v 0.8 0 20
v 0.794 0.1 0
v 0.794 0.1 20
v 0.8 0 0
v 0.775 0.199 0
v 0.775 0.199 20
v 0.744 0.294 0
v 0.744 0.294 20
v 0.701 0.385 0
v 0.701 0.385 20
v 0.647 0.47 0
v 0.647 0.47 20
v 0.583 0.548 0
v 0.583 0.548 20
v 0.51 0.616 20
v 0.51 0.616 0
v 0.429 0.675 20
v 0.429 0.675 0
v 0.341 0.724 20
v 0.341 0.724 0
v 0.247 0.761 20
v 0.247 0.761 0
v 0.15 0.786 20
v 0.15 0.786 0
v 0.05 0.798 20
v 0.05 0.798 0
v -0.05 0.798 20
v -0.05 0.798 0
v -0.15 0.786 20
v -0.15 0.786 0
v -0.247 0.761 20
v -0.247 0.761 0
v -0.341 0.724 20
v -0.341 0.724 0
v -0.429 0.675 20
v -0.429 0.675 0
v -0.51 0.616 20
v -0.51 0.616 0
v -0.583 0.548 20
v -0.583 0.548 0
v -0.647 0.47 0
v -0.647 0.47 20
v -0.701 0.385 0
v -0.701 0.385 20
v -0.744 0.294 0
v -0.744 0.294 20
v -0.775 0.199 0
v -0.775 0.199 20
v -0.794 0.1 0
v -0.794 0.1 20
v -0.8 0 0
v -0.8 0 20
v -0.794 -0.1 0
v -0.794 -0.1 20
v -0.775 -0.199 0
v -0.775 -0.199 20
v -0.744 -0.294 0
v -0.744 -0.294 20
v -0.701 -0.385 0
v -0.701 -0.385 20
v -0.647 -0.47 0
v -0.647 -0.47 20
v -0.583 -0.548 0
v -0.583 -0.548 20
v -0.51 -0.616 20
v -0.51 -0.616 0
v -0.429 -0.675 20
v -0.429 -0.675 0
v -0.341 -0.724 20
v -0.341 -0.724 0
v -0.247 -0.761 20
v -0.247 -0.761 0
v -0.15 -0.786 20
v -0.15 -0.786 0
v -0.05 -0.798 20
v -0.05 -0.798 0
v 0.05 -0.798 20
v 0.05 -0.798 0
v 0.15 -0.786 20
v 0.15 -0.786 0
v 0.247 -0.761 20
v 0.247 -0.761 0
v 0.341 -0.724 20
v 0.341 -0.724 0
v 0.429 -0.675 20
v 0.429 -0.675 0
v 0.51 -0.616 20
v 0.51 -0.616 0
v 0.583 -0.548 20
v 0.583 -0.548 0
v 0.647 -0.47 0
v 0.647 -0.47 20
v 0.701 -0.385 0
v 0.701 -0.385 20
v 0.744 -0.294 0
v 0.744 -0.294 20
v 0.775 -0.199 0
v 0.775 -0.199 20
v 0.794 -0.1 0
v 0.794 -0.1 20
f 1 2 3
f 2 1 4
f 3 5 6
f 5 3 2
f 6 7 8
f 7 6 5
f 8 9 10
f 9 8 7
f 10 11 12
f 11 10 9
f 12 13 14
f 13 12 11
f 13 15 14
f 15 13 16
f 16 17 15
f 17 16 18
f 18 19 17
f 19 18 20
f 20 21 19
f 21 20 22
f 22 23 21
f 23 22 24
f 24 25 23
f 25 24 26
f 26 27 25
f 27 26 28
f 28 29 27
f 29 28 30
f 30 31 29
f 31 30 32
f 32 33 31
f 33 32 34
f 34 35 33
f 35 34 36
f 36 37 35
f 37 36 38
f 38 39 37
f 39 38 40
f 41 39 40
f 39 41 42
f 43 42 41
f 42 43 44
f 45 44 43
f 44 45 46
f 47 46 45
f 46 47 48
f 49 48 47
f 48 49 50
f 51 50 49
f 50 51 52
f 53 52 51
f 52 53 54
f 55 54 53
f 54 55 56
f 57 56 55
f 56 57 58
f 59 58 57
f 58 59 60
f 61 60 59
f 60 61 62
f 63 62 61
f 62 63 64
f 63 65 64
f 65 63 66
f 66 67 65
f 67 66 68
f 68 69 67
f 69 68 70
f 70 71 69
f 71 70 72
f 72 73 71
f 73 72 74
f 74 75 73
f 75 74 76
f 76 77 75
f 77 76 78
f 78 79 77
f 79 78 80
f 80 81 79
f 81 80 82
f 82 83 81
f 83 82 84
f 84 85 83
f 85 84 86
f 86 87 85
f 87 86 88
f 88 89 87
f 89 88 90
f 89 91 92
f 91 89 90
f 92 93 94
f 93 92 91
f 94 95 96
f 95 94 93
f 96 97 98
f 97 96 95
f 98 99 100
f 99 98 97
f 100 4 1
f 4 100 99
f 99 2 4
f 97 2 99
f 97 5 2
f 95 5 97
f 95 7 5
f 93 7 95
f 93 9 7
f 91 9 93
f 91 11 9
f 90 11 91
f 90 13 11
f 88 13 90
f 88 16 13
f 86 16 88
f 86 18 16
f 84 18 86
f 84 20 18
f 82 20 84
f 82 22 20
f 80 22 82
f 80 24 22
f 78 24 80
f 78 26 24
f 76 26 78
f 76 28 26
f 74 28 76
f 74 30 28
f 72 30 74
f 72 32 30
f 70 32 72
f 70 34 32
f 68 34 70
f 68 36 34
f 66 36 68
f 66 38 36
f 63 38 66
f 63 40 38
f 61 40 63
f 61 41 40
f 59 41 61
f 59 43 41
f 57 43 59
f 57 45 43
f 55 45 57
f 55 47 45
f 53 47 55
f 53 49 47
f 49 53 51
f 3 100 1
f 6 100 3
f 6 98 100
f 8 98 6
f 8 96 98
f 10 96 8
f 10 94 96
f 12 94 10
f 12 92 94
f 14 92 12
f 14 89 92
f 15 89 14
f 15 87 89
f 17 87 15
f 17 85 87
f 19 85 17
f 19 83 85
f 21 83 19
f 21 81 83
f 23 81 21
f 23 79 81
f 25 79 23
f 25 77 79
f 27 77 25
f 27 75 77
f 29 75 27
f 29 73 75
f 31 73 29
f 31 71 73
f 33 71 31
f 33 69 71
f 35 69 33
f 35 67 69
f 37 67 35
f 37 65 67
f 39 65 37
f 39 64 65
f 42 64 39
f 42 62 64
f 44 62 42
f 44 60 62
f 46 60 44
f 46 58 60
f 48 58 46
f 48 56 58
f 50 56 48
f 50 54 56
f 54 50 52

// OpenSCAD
$fn=50; module cylindre() {
difference () {
cylinder(3, r1= 5, r2= 7);
translate([0,0,-3]);
cylinder(7, r1=0.8, r2= 0.8);

translate([0,0,2.4])
cylinder(5, r1= 2.1,r2= 2.1);

translate([0,0,2.3])
cylinder(5, r1=1.7, r2=1.7);
} };

module tige8(longueur){
cylinder(r=0.8,h=longueur);
};
//cylindre();
tige8(20);
